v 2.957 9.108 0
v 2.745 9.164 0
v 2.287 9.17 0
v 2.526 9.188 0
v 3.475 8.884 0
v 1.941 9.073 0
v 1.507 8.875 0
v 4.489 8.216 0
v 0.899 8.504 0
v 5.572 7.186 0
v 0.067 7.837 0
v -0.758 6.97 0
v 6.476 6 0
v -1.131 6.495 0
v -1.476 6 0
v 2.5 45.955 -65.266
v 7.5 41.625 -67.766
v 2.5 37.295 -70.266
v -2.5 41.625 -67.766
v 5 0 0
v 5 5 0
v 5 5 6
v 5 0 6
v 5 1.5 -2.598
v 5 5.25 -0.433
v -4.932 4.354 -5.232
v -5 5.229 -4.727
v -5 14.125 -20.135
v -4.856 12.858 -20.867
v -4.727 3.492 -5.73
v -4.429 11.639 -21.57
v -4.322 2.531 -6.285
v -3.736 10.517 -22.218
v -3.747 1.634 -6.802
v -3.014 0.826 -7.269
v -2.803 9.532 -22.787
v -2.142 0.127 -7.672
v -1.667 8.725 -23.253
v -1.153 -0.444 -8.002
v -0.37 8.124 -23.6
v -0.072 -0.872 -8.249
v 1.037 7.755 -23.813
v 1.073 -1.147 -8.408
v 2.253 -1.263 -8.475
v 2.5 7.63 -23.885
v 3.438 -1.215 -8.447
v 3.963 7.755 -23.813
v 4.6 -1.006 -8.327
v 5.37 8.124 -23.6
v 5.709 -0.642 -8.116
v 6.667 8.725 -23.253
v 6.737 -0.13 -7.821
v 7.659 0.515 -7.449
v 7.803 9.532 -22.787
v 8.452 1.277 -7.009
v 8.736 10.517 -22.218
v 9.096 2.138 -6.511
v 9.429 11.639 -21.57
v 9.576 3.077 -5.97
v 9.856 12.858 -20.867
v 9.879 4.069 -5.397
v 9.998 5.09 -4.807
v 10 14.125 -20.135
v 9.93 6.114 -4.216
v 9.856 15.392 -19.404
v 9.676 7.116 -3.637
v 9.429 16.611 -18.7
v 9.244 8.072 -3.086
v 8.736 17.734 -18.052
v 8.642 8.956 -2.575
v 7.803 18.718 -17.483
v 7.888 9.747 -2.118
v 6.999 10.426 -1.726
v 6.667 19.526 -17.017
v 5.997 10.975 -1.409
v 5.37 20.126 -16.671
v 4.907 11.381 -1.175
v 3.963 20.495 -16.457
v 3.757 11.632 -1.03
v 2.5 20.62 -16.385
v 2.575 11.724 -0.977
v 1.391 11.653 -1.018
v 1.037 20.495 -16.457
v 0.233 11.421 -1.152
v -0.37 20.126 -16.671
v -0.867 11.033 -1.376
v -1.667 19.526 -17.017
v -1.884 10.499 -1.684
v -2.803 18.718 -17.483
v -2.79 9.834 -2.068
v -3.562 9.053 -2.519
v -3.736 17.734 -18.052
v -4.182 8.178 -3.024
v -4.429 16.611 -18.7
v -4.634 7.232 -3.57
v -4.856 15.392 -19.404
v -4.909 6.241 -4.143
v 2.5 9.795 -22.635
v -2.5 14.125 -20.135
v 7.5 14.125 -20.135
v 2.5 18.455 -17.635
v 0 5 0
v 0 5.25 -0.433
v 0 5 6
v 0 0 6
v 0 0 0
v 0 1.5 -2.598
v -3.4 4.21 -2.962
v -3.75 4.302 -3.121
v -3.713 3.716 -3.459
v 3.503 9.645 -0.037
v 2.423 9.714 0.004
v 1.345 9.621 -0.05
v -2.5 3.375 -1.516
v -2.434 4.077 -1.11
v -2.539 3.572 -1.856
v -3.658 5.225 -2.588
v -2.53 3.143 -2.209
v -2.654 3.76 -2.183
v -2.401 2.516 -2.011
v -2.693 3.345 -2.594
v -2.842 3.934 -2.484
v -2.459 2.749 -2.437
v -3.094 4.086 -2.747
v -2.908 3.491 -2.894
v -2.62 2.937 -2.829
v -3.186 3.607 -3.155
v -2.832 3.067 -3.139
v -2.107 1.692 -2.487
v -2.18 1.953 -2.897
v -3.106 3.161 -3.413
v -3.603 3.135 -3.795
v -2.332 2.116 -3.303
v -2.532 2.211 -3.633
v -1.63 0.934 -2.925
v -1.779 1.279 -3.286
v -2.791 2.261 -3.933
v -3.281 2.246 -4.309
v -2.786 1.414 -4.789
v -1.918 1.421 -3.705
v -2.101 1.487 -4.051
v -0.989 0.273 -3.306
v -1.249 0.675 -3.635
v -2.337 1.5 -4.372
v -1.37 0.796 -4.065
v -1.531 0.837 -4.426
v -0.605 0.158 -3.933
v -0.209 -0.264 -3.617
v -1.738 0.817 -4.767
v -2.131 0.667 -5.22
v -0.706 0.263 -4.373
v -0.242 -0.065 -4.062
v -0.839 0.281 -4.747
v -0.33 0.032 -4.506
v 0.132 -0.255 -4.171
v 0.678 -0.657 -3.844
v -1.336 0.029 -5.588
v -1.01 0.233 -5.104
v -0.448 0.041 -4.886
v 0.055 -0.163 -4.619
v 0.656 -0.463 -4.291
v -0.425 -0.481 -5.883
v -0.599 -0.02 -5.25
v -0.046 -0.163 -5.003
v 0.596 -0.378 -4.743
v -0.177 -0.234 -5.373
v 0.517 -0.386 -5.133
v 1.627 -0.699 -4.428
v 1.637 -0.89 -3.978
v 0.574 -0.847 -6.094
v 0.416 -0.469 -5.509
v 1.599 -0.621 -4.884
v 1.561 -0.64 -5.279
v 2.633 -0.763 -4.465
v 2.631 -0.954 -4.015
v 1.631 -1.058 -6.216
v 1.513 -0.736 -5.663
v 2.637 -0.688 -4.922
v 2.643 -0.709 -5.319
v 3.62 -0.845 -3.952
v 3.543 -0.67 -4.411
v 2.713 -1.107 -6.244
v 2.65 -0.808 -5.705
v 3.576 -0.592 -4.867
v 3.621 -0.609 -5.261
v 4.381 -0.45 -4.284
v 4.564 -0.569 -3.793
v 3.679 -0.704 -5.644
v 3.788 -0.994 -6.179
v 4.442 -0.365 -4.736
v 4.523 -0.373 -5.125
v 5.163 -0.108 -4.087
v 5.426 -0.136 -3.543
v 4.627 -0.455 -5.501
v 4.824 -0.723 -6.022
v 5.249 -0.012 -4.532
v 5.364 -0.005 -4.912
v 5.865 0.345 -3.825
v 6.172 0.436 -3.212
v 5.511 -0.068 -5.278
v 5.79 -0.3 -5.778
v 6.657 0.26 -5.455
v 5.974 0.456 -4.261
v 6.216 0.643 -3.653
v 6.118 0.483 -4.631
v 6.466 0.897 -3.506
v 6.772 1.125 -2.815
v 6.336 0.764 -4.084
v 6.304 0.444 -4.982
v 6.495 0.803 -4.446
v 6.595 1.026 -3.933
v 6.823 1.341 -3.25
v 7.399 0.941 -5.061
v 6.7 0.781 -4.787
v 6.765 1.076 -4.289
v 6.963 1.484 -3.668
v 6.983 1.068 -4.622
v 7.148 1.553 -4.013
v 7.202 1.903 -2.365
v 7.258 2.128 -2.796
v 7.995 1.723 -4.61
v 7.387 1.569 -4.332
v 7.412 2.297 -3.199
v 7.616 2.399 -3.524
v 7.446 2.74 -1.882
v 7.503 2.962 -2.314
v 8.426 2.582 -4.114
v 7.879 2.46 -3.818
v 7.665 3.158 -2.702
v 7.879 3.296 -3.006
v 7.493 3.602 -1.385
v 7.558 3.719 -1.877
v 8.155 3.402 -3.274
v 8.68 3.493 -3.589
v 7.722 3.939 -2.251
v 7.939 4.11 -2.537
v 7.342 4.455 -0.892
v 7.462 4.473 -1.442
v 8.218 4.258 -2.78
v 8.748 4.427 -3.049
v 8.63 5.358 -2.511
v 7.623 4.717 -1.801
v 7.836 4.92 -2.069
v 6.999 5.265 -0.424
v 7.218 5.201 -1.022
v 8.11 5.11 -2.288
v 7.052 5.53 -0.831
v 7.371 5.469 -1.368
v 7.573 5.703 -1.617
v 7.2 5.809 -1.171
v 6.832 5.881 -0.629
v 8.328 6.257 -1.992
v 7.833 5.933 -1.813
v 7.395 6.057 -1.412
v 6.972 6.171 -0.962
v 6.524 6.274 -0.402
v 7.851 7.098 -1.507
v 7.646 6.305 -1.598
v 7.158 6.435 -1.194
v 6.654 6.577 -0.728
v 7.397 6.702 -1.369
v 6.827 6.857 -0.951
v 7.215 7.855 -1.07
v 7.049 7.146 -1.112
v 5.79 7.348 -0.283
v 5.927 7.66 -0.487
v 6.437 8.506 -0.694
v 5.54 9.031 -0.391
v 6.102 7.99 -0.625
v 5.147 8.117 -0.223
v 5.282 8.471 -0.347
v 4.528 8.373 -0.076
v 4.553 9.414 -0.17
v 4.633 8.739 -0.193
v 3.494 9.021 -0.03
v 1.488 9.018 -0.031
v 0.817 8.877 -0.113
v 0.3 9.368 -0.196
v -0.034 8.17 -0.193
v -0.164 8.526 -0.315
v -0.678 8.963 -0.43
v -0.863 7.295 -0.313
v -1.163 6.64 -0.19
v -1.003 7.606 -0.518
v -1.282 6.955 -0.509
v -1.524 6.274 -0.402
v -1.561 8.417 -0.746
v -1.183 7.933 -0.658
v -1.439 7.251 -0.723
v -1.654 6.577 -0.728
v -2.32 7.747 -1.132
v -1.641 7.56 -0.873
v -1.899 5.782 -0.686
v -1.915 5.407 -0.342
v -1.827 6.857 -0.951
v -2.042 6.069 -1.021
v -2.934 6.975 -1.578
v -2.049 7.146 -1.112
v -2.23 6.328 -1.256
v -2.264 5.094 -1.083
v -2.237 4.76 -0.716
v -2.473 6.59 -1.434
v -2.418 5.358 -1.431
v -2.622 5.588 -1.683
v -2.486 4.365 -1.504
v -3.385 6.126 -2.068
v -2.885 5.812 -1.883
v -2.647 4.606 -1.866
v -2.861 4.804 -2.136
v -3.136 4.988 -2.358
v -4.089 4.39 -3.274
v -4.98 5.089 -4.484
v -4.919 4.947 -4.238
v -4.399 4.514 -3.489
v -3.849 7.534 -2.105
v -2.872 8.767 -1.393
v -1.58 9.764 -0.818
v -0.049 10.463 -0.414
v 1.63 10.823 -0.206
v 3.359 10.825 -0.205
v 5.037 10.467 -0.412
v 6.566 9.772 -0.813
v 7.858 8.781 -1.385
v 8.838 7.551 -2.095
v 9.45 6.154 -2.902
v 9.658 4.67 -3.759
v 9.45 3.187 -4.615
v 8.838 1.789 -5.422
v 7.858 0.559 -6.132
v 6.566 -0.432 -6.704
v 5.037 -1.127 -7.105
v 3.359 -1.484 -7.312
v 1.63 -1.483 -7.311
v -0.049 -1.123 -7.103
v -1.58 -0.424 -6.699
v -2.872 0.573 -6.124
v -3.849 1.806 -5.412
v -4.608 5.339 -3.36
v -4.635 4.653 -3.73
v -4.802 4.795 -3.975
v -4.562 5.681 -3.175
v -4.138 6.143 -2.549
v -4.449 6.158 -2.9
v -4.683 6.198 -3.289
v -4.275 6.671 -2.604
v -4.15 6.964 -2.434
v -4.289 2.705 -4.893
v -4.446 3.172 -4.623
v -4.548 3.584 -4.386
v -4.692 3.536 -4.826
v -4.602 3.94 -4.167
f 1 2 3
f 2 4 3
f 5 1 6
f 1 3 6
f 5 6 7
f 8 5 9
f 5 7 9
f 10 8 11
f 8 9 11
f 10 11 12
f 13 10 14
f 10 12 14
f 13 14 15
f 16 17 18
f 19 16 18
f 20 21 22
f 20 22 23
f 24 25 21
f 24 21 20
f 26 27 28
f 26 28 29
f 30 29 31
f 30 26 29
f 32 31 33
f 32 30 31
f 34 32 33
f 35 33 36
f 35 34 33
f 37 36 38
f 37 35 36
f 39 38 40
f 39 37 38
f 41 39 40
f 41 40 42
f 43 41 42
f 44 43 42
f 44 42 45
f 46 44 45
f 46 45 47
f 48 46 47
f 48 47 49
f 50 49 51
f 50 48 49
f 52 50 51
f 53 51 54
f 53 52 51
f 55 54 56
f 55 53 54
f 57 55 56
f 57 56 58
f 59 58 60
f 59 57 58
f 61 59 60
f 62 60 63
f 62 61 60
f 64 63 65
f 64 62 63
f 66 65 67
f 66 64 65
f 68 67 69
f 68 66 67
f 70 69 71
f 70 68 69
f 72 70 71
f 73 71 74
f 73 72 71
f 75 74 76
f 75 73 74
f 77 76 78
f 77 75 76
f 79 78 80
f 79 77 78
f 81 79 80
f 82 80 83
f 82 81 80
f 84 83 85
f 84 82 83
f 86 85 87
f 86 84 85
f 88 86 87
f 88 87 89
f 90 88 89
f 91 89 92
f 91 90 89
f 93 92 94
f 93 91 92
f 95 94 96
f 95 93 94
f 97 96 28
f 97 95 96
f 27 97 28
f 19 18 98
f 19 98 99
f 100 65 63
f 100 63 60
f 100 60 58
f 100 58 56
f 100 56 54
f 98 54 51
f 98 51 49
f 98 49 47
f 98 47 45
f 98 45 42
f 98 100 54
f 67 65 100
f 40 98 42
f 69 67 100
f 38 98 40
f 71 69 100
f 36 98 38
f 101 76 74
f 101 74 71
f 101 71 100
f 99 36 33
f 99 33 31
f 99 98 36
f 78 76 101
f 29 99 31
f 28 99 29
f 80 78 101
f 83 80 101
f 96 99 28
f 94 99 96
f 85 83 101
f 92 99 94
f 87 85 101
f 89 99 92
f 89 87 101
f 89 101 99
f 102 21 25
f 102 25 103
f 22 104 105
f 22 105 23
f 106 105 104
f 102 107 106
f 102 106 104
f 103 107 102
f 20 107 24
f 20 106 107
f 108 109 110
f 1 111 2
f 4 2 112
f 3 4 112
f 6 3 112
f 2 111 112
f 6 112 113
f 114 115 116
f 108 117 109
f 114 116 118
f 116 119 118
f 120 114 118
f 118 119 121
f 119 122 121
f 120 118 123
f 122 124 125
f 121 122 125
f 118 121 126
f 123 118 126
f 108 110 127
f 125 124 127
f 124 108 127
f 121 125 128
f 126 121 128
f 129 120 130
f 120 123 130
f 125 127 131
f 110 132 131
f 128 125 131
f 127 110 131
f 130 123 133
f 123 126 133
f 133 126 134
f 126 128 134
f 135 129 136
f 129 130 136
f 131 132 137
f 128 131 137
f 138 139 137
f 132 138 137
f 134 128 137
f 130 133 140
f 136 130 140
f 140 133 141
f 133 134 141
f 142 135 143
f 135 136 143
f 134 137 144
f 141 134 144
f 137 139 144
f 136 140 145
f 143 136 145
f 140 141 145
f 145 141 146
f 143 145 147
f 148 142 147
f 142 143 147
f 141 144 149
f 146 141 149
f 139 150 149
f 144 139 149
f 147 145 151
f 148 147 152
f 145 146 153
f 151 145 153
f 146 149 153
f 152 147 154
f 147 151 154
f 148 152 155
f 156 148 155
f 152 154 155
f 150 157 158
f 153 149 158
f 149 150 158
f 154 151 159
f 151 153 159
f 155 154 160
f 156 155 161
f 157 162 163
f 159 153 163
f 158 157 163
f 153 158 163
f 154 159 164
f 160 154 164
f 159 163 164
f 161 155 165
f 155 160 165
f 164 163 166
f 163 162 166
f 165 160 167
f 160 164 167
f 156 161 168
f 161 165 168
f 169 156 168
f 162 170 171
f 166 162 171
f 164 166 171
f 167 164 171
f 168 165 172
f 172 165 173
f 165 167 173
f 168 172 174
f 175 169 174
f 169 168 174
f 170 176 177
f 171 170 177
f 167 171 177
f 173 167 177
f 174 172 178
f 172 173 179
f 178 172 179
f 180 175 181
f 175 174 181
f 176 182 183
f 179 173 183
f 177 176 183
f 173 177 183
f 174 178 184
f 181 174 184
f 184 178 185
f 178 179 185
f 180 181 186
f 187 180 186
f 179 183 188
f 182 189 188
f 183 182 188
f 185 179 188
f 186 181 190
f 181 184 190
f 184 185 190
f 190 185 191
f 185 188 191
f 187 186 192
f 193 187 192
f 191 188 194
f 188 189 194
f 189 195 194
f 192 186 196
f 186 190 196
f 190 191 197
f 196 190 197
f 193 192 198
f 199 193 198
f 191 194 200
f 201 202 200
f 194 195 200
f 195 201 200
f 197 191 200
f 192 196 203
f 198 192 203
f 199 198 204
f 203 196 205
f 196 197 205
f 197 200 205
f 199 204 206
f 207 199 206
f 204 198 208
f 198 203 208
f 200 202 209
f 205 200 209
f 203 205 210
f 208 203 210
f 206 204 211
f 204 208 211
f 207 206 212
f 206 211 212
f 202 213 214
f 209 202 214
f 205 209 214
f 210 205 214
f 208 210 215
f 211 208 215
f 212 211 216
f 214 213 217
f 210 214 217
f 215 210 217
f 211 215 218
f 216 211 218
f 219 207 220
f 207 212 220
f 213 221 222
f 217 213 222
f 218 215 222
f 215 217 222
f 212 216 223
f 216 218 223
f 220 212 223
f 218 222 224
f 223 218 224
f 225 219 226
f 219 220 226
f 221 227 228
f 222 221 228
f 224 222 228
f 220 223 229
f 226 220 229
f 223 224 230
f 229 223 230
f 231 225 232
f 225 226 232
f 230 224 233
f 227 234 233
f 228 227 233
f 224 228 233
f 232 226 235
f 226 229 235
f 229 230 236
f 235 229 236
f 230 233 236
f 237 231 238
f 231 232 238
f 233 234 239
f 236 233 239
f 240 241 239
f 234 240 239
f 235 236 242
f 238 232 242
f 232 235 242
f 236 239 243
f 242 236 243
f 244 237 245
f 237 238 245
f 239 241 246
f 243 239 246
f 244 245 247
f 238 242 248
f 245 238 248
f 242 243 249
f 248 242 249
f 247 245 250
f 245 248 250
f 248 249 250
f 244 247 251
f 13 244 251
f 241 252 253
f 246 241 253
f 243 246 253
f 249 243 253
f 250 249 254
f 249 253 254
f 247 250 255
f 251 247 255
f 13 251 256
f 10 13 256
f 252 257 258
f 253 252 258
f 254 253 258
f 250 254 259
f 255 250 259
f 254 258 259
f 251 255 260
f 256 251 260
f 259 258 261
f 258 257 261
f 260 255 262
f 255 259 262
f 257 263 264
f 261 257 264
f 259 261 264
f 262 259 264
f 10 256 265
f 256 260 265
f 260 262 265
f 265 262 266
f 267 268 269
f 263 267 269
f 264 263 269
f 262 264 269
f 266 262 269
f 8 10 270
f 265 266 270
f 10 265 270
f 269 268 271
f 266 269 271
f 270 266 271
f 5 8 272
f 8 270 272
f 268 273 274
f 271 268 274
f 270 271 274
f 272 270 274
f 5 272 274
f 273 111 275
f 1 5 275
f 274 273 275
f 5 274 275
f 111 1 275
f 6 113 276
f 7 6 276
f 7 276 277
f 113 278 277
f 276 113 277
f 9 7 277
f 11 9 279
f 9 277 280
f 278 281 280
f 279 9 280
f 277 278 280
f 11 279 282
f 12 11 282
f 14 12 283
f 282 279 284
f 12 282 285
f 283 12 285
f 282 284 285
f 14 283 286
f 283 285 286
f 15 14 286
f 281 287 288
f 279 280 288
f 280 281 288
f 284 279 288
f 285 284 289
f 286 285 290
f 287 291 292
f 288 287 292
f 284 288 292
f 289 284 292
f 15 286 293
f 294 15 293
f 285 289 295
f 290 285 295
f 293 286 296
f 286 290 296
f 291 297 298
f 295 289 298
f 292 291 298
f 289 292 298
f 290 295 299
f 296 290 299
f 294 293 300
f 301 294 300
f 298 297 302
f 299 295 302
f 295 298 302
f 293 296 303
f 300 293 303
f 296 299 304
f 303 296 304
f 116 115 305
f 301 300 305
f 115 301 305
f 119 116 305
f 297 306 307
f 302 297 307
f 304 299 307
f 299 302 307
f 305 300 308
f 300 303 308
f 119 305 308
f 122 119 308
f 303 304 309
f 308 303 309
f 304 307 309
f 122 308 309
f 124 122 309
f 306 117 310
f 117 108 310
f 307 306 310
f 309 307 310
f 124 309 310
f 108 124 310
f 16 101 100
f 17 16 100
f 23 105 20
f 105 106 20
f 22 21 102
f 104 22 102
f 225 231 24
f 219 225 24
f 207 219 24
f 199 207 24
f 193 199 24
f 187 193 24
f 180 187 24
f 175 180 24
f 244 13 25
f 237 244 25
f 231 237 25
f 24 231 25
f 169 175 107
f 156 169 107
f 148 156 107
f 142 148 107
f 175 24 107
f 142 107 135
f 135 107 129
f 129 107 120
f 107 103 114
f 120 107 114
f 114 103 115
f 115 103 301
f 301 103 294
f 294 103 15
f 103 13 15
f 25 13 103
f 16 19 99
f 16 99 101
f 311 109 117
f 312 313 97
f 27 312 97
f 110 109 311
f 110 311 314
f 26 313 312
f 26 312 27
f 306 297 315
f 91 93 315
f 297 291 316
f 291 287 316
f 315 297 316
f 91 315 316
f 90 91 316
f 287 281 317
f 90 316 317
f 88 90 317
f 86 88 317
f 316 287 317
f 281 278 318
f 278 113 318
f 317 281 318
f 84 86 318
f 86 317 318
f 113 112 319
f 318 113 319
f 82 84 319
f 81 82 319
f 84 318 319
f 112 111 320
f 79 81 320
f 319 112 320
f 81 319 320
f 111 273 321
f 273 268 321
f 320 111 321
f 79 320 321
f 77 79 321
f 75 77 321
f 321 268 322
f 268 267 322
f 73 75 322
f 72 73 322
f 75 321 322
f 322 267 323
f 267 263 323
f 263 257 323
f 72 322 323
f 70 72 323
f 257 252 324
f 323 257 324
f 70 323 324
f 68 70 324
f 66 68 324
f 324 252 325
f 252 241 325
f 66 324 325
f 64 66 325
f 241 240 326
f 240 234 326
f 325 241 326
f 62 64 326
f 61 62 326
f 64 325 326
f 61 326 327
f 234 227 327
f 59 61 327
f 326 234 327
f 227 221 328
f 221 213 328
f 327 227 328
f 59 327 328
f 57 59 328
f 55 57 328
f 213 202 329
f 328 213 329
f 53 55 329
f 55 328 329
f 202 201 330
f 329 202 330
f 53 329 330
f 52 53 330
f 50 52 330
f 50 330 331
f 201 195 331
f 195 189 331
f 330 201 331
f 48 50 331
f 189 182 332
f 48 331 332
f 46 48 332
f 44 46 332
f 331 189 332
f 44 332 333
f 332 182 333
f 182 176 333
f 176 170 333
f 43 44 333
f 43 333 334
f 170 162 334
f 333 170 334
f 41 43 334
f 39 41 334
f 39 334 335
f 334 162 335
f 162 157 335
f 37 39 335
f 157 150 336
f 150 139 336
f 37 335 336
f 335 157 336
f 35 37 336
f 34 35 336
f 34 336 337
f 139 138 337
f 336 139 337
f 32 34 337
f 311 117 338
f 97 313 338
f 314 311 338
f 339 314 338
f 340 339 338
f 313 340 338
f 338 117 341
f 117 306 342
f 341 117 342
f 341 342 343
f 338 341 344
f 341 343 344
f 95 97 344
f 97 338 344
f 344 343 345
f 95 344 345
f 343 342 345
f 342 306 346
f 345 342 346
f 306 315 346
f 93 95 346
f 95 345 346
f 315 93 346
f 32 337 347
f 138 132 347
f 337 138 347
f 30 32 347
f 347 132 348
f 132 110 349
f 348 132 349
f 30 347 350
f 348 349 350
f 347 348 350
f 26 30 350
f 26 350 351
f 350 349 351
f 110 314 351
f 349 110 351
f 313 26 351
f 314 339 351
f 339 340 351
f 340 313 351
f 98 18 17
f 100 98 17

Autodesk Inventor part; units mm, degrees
ref_plane "YZ Plane" through (0, 0, 0) normal (1, 0, 0) x (0, 1, 0)
sketch "Esquisse1" plane through (0, 0, 0) normal (0, 0, 1) x (1, 0, 0)
  line L0 (0, 0) -> (5, 0)
  line L1 (5, 0) -> (5, 5)
  line L2 (5, 5) -> (0, 5)
  line L3 (0, 5) -> (0, 0)
  dimension "d0" = 5
  dimension "d1" = 5
extrude "Extrusion1" add sketch "Esquisse1" along normal blind 5
ref_plane "Plan de construction1" through (0, 0, 5) normal (0, -0.5, 0.8660254) x (1, 0, 0)
sketch "Esquisse2" plane through (0, 0, 5) normal (0, -0.5, 0.8660254) x (1, 0, 0)
  line L0 (0, 4.3301) -> (5, 4.3301)
  line L1 (5, 0) -> (5, 4.3301) projected
  line L2 (0, 4.3301) -> (5, 4.3301)
  line L3 (5, 4.3301) -> (5, 0)
  line L4 (5, 0) -> (0, 0)
  line L5 (0, 0) -> (0, 4.3301)
  point P0 (0, -2.5)
extrude "Extrusion2" add sketch "Esquisse2" along normal mid plane 5
sketch "Esquisse3" plane through (0, -1.25, 7.1651) normal (0, -0.5, 0.8660254) x (1, 0, 0)
  line L0 (0, 0) -> (5, 0) projected
  line L1 (5, 0) -> (5, 4.3301) projected
  line L2 (5, 4.3301) -> (0, 4.3301) projected
  line L3 (0, 4.3301) -> (0, 0) projected
  point P0 (0, -2.5)
extrude "Extrusion3" add sketch "Esquisse3" along normal blind 5
fillet "Congé1" radius 2 2 edges at (2.5, 0, 13.6603) (2.5, -3.75, 11.4952)
ref_plane "Plan de construction2" through (5, 5, 0) normal (0, 0.5, -0.8660254) x (-1, 0, 0)
sketch "Esquisse4" plane through (5, 5, 0) normal (0, 0.5, -0.8660254) x (-1, 0, 0)
  line L0 (0, 0) -> (0, 2.5) projected
  line L1 (5, -4.3301) -> (5, -1.8301) projected
  line L2 (0, 0) -> (5, 0)
  line L3 (5, 0) -> (5, -4.3301)
  line L4 (5, -4.3301) -> (0, -4.3301)
  line L5 (0, -4.3301) -> (0, 0)
  point P0 (5, -1.8301)
extrude "Extrusion4" add sketch "Esquisse4" along normal mid plane 5
sketch "Esquisse6" plane through (5, 6.25, -2.1651) normal (0, 0.5, -0.8660254) x (-1, 0, 0)
  line L0 (0, 0) -> (5, 0) projected
  line L1 (5, 0) -> (2.5, 0)
  line L2 (2.5, 0) -> (2.5, -2.165)
  circle A0 centre (2.5, -2.165) radius 5
  point P0 (5, -4.3301)
  dimension "d14" = 2.165
  dimension "d15" = 10
extrude "Extrusion5" add sketch "Esquisse6" against normal blind 2
sketch "Esquisse7" plane through (5, 5, 5) normal (1, 0, 0) x (0, 0, -1)
  line L0 (5.433, 0.25) -> (5, 0) projected
  line L1 (5, 0) -> (-0.081, 0)
  line L2 (-0.081, 0) -> (-0.081, 15.1439)
  line L3 (-0.081, 15.1439) -> (5, 15.1439)
  line L4 (5, 15.1439) -> (5, 0)
  point P0 (5, -5)
extrude "Extrusion6" cut sketch "Esquisse7" along normal through all both and the other way through all
sketch "Esquisse8" plane through (2.5, 4.3751, -3.2476) normal (0, 0.5, -0.8660254) x (-1, 0, 0)
  arc A0 (3.9765, 3.031) -> (-3.9765, 3.031) centre (0, 0) ccw projected
  line L0 (0, 5) -> (-5, 0)
  arc A1 (-3.9765, 3.031) -> (3.9765, 3.031) centre (0, 0) ccw projected
  line L1 (0, -5) -> (-5, 0)
  line L2 (0, -5) -> (5, 0)
  line L3 (5, 0) -> (0, 5)
  point P0 (2.5, -2.1651)
extrude "Extrusion7" add sketch "Esquisse8" along normal blind 74.5 contours L3 L2 L1 L0
sketch "Esquisse9" plane through (5, 6.25, -2.1651) normal (0, 0.5, -0.8660254) x (-1, 0, 0)
  line L0 (7.5, -2.165) -> (2.5, 2.835) projected
  arc A0 (-1.4765, 0.866) -> (6.4765, 0.866) centre (2.5, -2.165) ccw projected
  arc A1 (6.4765, 0.866) -> (-1.4765, 0.866) centre (2.5, -2.165) ccw projected
  circle A2 centre (2.5, -2.165) radius 7.5
  point P0 (5, -4.3301)
  dimension "d24" = 15
extrude "Extrusion8" add sketch "Esquisse9" along normal blind 19.5 contours A0 A1 L0 | L0 A1 A0 | A2
fillet "Congé2" radius 2 1 edges at (7.5, 4.3751, -3.2476)
fillet "Congé3" radius 2 1 edges at (10, 4.3751, -3.2476)
sketch "Esquisse10" plane through (5, 5, 5) normal (1, 0, 0) x (0, 0, -1)
  line L0 (0, 0) -> (-6.9282, -4) projected
  line L1 (0, 0) -> (-8.5321, 0)
  line L2 (-8.5321, 0) -> (-8.5321, -9.6747)
  line L3 (-8.5321, -9.6747) -> (0, -9.6747)
  line L4 (0, -9.6747) -> (0, 0)
  point P0 (5, -5)
extrude "Extrusion9" cut sketch "Esquisse10" against normal through all
sketch "Esquisse11" plane through (5, 0, 5) normal (0, 0, 1) x (1, 0, 0)
  line L0 (-5, 0) -> (0, 0) projected
  line L1 (0, 5) -> (0, 0) projected
  line L2 (0, 5) -> (-5, 5) projected
  line L3 (-5, 0) -> (-5, 5) projected
  line L4 (-5, 0) -> (0, 0) projected
  line L5 (0, 5) -> (0, 0) projected
  line L6 (0, 5) -> (-5, 5) projected
  line L7 (-5, 0) -> (-5, 5) projected
extrude "Extrusion10" add sketch "Esquisse11" along normal blind 1
properties part number "Bras hélice"
